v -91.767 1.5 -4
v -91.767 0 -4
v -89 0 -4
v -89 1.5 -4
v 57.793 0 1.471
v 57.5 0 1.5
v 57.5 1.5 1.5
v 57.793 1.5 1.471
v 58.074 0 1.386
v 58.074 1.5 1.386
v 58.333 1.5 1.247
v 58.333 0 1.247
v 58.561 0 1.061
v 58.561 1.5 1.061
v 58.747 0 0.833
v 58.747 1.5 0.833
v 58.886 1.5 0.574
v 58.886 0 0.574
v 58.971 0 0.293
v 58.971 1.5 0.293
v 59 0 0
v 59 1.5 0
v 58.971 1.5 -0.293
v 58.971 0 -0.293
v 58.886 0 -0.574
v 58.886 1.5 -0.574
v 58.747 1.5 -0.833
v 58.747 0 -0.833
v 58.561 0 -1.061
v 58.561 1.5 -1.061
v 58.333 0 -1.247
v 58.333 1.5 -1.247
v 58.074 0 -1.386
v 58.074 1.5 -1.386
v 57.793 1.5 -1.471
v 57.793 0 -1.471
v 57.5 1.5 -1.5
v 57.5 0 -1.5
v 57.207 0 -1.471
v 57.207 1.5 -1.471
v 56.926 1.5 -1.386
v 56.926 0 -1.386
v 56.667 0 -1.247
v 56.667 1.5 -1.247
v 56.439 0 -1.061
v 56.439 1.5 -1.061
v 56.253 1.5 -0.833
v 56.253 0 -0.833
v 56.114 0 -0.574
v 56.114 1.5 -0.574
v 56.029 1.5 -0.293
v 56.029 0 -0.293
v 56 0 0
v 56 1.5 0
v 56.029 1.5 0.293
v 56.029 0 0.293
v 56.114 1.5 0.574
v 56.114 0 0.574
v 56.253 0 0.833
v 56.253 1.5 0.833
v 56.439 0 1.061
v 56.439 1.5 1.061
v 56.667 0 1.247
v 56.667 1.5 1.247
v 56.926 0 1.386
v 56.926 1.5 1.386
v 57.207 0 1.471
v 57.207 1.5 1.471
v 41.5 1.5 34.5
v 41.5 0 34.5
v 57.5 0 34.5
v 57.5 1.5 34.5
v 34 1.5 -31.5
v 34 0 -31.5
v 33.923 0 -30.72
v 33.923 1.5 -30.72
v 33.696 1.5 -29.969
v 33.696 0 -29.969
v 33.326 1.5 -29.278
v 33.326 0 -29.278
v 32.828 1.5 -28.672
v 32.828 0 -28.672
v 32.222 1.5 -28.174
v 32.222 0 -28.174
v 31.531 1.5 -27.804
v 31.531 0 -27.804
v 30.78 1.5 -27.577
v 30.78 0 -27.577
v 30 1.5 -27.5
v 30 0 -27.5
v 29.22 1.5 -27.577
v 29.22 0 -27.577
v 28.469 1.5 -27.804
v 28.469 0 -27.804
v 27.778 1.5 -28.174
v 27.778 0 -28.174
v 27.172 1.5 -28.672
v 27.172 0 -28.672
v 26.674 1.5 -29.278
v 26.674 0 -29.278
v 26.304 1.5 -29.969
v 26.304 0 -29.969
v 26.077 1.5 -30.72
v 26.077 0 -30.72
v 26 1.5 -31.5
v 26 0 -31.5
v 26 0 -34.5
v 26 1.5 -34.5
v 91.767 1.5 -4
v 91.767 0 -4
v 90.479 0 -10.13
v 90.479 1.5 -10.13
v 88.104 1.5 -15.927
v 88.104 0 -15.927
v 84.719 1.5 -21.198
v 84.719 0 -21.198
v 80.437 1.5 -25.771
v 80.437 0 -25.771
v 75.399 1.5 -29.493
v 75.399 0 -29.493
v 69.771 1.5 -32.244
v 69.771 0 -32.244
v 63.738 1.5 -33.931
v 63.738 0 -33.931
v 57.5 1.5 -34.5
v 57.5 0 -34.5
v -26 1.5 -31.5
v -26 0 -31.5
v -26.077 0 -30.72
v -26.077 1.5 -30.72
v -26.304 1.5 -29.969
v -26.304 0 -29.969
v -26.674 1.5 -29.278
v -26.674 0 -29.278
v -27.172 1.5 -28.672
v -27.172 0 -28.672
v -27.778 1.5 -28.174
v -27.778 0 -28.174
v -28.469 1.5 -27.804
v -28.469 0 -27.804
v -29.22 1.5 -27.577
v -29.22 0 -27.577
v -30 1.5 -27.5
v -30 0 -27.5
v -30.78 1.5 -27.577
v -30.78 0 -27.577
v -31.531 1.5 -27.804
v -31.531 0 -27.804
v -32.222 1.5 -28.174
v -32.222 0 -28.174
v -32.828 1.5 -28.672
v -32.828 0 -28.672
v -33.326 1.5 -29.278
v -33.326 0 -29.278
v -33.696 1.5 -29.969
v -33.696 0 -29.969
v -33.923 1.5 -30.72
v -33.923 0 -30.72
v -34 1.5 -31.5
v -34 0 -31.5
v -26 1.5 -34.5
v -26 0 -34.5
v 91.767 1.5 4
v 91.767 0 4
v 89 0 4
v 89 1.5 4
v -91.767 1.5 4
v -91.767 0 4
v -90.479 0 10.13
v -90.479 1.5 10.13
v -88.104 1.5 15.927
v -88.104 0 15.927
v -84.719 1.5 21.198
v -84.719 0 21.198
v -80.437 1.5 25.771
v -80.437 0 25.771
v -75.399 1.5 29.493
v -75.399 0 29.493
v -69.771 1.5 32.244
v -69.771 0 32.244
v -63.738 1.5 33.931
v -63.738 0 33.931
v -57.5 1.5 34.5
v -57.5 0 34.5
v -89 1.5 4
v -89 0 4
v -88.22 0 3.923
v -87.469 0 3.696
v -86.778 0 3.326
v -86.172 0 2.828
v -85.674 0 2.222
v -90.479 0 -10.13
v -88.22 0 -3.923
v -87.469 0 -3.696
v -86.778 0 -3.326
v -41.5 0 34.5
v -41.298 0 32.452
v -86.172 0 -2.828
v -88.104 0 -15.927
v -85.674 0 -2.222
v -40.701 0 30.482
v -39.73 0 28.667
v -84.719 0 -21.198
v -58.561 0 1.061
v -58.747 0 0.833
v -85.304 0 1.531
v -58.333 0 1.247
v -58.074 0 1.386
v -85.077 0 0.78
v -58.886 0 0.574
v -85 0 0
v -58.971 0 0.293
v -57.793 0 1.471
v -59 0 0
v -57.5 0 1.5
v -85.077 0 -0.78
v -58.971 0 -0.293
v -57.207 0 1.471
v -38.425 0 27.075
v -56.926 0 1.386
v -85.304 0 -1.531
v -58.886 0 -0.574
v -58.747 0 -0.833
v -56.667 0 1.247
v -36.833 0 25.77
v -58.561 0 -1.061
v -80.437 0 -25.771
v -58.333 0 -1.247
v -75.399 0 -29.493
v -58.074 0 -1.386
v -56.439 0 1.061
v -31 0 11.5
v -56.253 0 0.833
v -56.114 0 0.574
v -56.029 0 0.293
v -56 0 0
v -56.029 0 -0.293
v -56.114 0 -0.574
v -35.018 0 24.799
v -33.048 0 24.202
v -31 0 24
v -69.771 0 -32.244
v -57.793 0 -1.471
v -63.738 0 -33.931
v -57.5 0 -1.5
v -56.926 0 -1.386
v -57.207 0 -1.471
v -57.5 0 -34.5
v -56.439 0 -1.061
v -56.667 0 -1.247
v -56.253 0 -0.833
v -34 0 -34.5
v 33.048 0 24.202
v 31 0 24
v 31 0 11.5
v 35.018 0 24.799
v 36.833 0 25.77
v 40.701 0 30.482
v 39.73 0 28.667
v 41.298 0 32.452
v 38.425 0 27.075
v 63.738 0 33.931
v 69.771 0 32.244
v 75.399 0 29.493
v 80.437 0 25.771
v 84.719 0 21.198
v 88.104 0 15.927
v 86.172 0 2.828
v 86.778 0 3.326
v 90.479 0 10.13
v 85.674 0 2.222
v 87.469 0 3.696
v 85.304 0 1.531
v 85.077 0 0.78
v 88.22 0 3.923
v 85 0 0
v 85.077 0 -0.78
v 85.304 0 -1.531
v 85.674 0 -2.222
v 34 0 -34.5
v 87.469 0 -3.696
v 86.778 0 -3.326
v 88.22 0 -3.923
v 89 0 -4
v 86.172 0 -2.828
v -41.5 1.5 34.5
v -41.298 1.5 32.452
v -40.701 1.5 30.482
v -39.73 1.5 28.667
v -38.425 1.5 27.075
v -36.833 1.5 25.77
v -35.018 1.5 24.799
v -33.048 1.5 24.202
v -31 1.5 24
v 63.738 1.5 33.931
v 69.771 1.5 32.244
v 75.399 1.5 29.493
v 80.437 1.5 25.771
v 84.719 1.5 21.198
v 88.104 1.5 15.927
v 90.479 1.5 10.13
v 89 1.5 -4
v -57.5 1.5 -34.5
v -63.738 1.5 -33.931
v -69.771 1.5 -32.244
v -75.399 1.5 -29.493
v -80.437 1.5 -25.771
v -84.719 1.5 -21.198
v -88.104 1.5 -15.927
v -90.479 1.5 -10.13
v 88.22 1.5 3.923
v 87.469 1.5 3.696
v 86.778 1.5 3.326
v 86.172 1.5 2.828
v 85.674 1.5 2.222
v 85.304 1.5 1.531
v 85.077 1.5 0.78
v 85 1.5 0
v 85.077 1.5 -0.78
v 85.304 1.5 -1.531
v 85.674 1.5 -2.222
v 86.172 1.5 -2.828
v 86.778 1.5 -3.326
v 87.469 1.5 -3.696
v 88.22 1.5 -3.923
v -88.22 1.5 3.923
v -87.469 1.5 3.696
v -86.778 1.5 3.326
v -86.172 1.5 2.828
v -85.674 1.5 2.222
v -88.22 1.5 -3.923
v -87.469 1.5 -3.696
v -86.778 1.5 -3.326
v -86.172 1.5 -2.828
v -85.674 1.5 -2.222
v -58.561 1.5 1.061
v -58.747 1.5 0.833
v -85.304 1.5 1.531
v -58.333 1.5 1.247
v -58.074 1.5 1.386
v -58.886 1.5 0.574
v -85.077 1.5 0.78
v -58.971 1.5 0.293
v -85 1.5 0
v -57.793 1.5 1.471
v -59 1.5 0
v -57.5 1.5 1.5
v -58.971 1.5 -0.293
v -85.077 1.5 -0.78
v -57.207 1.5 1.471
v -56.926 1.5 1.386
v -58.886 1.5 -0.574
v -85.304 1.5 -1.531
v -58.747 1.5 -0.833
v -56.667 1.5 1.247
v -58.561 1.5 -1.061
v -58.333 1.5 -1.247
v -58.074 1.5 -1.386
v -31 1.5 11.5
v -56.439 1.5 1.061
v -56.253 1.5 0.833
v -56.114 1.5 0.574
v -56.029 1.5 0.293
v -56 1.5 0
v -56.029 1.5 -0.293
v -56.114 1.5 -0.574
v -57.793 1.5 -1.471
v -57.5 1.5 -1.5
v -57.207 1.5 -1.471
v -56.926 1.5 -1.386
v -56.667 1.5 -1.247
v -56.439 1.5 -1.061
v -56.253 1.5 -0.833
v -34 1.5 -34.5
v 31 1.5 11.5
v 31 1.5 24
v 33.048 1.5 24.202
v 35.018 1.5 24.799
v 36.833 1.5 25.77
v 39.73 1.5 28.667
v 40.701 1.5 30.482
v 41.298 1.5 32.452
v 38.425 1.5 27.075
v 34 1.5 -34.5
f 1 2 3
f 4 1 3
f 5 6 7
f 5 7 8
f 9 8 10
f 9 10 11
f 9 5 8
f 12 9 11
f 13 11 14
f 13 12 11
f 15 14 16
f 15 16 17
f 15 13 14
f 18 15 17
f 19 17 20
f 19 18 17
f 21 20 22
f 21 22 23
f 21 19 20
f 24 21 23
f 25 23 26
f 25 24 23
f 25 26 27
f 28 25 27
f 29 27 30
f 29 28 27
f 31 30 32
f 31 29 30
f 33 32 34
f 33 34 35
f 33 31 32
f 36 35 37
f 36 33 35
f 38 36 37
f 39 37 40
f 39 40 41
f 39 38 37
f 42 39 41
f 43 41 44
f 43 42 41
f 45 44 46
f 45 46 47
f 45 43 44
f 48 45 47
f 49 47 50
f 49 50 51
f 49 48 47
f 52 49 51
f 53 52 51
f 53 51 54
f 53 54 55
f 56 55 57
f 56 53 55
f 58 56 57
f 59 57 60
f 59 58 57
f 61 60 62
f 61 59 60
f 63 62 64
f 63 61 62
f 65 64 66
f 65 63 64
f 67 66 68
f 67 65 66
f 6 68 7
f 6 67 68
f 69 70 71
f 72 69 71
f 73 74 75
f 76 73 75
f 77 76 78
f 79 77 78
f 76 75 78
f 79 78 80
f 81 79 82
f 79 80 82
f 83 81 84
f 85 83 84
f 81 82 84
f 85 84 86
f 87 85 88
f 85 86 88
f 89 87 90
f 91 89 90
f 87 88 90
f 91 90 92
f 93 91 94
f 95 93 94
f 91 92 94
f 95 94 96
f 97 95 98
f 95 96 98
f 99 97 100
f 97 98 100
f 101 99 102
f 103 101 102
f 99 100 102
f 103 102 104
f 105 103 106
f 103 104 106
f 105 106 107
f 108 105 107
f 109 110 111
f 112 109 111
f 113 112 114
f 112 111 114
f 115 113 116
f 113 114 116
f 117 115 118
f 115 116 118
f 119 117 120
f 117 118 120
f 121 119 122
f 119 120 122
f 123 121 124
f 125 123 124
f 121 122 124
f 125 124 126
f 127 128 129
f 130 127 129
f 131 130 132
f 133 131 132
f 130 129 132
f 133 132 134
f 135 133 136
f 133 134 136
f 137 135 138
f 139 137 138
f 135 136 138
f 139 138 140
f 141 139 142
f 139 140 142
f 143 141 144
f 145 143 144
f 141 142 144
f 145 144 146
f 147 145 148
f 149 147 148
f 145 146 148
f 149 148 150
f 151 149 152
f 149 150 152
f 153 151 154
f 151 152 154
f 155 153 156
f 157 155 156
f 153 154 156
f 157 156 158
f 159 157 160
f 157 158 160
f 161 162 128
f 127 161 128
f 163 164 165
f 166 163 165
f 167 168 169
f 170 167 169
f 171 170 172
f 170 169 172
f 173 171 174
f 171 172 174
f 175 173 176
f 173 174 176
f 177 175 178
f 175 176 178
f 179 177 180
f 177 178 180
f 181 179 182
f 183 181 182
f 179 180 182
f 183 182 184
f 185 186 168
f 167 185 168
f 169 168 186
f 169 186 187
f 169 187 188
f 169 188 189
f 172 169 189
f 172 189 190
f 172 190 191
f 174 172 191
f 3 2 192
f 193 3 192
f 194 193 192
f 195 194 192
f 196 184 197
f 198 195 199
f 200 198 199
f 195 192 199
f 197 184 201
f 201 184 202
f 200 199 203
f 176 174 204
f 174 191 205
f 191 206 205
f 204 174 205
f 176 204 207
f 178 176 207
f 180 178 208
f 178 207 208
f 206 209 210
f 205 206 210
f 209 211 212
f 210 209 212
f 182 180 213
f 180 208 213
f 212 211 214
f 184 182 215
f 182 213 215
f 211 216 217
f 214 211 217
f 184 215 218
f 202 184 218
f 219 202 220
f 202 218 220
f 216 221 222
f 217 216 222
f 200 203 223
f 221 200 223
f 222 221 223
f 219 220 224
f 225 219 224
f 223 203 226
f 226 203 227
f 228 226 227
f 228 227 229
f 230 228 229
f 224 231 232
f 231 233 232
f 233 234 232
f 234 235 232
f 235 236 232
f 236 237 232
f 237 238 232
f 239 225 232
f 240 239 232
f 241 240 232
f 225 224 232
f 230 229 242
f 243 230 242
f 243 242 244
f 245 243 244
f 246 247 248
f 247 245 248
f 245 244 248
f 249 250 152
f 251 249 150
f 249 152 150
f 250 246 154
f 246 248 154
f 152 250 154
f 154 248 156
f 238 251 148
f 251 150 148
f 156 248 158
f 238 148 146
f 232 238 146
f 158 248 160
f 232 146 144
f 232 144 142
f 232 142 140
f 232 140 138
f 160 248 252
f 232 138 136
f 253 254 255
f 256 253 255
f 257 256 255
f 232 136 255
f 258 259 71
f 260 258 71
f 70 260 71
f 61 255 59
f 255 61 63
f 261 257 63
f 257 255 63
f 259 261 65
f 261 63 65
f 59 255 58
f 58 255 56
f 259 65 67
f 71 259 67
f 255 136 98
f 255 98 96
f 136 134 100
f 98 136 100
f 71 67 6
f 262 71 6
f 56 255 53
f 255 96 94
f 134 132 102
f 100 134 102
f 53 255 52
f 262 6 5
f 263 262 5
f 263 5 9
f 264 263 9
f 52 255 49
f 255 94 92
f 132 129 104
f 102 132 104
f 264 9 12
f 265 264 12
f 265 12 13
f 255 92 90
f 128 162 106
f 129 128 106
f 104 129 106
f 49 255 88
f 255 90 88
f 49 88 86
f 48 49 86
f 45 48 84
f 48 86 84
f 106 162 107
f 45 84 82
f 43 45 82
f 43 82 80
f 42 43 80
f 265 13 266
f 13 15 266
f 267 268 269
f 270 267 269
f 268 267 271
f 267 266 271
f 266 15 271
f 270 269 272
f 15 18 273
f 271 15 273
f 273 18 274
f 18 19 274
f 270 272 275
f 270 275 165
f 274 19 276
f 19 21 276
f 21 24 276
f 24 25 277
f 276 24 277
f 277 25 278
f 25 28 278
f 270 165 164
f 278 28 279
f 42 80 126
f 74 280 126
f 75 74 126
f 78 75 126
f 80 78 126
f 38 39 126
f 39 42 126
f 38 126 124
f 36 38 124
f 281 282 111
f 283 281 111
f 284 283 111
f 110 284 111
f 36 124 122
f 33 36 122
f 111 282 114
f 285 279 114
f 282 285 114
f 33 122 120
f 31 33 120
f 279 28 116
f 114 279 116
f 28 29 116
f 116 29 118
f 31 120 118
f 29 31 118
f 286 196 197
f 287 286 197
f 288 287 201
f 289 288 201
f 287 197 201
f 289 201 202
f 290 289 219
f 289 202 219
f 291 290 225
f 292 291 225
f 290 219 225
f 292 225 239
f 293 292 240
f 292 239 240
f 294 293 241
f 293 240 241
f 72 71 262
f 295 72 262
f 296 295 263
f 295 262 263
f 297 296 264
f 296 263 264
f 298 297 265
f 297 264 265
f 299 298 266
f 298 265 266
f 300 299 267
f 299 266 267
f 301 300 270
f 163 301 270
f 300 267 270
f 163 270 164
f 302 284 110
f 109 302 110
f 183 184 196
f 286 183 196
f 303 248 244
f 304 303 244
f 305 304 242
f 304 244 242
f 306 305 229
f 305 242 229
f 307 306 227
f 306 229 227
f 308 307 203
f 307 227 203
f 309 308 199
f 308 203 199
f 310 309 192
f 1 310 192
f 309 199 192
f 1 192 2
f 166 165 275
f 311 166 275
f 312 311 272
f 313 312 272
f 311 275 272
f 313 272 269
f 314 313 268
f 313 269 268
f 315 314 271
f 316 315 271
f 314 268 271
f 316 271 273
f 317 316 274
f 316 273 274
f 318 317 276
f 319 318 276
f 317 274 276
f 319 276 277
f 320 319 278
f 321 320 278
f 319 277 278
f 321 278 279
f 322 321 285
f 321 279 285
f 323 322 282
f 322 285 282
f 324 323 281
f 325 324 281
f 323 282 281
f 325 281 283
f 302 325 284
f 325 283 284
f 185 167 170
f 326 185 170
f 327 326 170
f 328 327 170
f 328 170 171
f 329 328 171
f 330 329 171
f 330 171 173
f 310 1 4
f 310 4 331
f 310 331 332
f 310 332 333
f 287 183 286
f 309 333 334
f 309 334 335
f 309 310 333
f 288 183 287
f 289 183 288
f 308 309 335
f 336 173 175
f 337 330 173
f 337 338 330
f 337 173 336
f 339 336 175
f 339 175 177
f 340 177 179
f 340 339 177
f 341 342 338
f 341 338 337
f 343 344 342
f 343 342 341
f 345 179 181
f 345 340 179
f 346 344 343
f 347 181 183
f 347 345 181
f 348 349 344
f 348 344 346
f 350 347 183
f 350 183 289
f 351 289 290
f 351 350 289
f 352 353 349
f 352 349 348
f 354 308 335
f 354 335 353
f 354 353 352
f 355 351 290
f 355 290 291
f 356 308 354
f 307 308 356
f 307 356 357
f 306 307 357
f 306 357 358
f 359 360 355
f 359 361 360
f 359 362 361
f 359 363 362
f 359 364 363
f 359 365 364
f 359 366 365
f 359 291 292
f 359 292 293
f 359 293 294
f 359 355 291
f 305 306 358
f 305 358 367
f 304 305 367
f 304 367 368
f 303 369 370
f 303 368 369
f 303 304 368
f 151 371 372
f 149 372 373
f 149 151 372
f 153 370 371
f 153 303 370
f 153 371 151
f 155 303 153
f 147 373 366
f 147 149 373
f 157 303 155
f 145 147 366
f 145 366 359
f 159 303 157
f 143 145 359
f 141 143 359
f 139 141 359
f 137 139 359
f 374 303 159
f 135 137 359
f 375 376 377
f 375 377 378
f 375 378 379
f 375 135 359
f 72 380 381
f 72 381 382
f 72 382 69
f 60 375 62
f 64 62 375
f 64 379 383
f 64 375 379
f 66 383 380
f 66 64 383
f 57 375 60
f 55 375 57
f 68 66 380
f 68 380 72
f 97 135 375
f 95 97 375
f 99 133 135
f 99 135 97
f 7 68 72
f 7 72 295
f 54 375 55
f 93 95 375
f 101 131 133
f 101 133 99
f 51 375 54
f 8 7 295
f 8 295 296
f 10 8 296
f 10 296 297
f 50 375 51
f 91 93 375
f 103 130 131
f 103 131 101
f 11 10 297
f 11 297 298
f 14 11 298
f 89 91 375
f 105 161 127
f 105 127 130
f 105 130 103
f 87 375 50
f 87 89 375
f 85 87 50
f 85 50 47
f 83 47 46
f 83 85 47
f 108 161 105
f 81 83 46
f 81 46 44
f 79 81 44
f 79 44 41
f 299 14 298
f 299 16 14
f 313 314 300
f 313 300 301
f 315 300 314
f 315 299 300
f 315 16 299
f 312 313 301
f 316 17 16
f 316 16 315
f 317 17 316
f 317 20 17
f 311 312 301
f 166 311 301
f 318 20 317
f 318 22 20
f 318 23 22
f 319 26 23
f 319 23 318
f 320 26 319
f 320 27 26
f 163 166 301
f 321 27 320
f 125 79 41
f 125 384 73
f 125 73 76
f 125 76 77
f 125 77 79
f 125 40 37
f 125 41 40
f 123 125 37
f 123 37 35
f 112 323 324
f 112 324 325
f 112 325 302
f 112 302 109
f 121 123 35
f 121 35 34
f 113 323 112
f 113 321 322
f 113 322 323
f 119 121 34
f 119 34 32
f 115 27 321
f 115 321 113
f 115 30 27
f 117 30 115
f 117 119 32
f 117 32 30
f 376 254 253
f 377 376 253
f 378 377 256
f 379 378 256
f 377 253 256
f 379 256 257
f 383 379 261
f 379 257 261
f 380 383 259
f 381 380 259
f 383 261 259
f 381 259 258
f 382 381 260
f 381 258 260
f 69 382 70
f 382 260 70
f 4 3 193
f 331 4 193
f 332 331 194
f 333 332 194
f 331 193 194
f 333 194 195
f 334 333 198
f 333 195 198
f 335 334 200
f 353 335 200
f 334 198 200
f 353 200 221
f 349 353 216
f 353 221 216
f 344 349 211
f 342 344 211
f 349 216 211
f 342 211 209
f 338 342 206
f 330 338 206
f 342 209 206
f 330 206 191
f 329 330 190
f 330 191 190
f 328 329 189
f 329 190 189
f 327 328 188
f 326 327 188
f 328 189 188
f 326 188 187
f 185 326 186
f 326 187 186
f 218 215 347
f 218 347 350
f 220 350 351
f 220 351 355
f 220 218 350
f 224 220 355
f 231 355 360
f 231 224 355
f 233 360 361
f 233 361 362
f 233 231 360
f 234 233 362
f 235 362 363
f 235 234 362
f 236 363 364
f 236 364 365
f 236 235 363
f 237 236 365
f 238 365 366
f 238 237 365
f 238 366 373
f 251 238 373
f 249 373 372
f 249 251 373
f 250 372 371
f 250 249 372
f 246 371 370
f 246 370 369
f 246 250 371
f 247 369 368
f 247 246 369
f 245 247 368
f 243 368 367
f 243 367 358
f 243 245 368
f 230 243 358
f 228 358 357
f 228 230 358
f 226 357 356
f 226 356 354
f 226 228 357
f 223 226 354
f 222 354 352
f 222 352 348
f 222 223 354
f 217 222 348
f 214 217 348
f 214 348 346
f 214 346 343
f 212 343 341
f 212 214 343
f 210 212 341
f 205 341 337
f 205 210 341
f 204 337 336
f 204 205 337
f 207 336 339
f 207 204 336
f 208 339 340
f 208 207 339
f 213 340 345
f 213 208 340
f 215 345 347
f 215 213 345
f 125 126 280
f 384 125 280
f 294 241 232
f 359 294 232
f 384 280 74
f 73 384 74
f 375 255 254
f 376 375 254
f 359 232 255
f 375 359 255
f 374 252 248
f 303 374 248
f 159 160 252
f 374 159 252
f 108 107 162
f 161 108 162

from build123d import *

# Parameters (mm, degrees)
SKETCH1_R   = 1.5
BOARD_DEPTH = 1.5


with BuildPart() as part:
    # Sketch1 → board (new body)
    with BuildSketch(Plane(origin=(0, 0, 0), x_dir=(1, 0, 0), z_dir=(0, 1, 0))):
        with BuildLine():
            Line((0, 34.5), (-26, 34.5))
            Line((-26, 34.5), (-26, 31.5))
            ThreePointArc((-26, 31.5), (-30, 27.5), (-34, 31.5))
            Line((-34, 31.5), (-34, 34.5))
            Line((-34, 34.5), (-57.5, 34.5))
            ThreePointArc((-57.5, 34.5), (-80.43741485, 25.77062281), (-91.767331381, 4))
            Line((-91.767331381, 4), (-89, 4))
            ThreePointArc((-89, 4), (-85, 0), (-89, -4))
            Line((-89, -4), (-91.767331381, -4))
            ThreePointArc((-91.767331381, -4), (-80.43741485, -25.77062281), (-57.5, -34.5))
            Line((-57.5, -34.5), (-41.5, -34.5))
            ThreePointArc((-41.5, -34.5), (-38.424621202, -27.075378798), (-31, -24))
            Line((-31, -24), (-31, -11.5))
            Line((-31, -11.5), (31, -11.5))
            Line((31, -11.5), (31, -24))
            ThreePointArc((31, -24), (38.424621202, -27.075378798), (41.5, -34.5))
            Line((41.5, -34.5), (57.5, -34.5))
            ThreePointArc((57.5, -34.5), (80.43741485, -25.77062281), (91.767331381, -4))
            Line((91.767331381, -4), (89, -4))
            ThreePointArc((89, -4), (85, 0), (89, 4))
            Line((89, 4), (91.767331381, 4))
            ThreePointArc((91.767331381, 4), (80.43741485, 25.77062281), (57.5, 34.5))
            Line((57.5, 34.5), (34, 34.5))
            Line((34, 34.5), (34, 31.5))
            ThreePointArc((34, 31.5), (30, 27.5), (26, 31.5))
            Line((26, 31.5), (26, 34.5))
            Line((26, 34.5), (0, 34.5))
        make_face()
        with Locations(Location((-57.5, 0, 0), (0, 0, 270))):
            Circle(SKETCH1_R, mode=Mode.SUBTRACT)
        with Locations(Location((57.5, 0, 0), (0, 0, 270))):
            Circle(SKETCH1_R, mode=Mode.SUBTRACT)
    extrude(amount=BOARD_DEPTH)


solid = part.part
